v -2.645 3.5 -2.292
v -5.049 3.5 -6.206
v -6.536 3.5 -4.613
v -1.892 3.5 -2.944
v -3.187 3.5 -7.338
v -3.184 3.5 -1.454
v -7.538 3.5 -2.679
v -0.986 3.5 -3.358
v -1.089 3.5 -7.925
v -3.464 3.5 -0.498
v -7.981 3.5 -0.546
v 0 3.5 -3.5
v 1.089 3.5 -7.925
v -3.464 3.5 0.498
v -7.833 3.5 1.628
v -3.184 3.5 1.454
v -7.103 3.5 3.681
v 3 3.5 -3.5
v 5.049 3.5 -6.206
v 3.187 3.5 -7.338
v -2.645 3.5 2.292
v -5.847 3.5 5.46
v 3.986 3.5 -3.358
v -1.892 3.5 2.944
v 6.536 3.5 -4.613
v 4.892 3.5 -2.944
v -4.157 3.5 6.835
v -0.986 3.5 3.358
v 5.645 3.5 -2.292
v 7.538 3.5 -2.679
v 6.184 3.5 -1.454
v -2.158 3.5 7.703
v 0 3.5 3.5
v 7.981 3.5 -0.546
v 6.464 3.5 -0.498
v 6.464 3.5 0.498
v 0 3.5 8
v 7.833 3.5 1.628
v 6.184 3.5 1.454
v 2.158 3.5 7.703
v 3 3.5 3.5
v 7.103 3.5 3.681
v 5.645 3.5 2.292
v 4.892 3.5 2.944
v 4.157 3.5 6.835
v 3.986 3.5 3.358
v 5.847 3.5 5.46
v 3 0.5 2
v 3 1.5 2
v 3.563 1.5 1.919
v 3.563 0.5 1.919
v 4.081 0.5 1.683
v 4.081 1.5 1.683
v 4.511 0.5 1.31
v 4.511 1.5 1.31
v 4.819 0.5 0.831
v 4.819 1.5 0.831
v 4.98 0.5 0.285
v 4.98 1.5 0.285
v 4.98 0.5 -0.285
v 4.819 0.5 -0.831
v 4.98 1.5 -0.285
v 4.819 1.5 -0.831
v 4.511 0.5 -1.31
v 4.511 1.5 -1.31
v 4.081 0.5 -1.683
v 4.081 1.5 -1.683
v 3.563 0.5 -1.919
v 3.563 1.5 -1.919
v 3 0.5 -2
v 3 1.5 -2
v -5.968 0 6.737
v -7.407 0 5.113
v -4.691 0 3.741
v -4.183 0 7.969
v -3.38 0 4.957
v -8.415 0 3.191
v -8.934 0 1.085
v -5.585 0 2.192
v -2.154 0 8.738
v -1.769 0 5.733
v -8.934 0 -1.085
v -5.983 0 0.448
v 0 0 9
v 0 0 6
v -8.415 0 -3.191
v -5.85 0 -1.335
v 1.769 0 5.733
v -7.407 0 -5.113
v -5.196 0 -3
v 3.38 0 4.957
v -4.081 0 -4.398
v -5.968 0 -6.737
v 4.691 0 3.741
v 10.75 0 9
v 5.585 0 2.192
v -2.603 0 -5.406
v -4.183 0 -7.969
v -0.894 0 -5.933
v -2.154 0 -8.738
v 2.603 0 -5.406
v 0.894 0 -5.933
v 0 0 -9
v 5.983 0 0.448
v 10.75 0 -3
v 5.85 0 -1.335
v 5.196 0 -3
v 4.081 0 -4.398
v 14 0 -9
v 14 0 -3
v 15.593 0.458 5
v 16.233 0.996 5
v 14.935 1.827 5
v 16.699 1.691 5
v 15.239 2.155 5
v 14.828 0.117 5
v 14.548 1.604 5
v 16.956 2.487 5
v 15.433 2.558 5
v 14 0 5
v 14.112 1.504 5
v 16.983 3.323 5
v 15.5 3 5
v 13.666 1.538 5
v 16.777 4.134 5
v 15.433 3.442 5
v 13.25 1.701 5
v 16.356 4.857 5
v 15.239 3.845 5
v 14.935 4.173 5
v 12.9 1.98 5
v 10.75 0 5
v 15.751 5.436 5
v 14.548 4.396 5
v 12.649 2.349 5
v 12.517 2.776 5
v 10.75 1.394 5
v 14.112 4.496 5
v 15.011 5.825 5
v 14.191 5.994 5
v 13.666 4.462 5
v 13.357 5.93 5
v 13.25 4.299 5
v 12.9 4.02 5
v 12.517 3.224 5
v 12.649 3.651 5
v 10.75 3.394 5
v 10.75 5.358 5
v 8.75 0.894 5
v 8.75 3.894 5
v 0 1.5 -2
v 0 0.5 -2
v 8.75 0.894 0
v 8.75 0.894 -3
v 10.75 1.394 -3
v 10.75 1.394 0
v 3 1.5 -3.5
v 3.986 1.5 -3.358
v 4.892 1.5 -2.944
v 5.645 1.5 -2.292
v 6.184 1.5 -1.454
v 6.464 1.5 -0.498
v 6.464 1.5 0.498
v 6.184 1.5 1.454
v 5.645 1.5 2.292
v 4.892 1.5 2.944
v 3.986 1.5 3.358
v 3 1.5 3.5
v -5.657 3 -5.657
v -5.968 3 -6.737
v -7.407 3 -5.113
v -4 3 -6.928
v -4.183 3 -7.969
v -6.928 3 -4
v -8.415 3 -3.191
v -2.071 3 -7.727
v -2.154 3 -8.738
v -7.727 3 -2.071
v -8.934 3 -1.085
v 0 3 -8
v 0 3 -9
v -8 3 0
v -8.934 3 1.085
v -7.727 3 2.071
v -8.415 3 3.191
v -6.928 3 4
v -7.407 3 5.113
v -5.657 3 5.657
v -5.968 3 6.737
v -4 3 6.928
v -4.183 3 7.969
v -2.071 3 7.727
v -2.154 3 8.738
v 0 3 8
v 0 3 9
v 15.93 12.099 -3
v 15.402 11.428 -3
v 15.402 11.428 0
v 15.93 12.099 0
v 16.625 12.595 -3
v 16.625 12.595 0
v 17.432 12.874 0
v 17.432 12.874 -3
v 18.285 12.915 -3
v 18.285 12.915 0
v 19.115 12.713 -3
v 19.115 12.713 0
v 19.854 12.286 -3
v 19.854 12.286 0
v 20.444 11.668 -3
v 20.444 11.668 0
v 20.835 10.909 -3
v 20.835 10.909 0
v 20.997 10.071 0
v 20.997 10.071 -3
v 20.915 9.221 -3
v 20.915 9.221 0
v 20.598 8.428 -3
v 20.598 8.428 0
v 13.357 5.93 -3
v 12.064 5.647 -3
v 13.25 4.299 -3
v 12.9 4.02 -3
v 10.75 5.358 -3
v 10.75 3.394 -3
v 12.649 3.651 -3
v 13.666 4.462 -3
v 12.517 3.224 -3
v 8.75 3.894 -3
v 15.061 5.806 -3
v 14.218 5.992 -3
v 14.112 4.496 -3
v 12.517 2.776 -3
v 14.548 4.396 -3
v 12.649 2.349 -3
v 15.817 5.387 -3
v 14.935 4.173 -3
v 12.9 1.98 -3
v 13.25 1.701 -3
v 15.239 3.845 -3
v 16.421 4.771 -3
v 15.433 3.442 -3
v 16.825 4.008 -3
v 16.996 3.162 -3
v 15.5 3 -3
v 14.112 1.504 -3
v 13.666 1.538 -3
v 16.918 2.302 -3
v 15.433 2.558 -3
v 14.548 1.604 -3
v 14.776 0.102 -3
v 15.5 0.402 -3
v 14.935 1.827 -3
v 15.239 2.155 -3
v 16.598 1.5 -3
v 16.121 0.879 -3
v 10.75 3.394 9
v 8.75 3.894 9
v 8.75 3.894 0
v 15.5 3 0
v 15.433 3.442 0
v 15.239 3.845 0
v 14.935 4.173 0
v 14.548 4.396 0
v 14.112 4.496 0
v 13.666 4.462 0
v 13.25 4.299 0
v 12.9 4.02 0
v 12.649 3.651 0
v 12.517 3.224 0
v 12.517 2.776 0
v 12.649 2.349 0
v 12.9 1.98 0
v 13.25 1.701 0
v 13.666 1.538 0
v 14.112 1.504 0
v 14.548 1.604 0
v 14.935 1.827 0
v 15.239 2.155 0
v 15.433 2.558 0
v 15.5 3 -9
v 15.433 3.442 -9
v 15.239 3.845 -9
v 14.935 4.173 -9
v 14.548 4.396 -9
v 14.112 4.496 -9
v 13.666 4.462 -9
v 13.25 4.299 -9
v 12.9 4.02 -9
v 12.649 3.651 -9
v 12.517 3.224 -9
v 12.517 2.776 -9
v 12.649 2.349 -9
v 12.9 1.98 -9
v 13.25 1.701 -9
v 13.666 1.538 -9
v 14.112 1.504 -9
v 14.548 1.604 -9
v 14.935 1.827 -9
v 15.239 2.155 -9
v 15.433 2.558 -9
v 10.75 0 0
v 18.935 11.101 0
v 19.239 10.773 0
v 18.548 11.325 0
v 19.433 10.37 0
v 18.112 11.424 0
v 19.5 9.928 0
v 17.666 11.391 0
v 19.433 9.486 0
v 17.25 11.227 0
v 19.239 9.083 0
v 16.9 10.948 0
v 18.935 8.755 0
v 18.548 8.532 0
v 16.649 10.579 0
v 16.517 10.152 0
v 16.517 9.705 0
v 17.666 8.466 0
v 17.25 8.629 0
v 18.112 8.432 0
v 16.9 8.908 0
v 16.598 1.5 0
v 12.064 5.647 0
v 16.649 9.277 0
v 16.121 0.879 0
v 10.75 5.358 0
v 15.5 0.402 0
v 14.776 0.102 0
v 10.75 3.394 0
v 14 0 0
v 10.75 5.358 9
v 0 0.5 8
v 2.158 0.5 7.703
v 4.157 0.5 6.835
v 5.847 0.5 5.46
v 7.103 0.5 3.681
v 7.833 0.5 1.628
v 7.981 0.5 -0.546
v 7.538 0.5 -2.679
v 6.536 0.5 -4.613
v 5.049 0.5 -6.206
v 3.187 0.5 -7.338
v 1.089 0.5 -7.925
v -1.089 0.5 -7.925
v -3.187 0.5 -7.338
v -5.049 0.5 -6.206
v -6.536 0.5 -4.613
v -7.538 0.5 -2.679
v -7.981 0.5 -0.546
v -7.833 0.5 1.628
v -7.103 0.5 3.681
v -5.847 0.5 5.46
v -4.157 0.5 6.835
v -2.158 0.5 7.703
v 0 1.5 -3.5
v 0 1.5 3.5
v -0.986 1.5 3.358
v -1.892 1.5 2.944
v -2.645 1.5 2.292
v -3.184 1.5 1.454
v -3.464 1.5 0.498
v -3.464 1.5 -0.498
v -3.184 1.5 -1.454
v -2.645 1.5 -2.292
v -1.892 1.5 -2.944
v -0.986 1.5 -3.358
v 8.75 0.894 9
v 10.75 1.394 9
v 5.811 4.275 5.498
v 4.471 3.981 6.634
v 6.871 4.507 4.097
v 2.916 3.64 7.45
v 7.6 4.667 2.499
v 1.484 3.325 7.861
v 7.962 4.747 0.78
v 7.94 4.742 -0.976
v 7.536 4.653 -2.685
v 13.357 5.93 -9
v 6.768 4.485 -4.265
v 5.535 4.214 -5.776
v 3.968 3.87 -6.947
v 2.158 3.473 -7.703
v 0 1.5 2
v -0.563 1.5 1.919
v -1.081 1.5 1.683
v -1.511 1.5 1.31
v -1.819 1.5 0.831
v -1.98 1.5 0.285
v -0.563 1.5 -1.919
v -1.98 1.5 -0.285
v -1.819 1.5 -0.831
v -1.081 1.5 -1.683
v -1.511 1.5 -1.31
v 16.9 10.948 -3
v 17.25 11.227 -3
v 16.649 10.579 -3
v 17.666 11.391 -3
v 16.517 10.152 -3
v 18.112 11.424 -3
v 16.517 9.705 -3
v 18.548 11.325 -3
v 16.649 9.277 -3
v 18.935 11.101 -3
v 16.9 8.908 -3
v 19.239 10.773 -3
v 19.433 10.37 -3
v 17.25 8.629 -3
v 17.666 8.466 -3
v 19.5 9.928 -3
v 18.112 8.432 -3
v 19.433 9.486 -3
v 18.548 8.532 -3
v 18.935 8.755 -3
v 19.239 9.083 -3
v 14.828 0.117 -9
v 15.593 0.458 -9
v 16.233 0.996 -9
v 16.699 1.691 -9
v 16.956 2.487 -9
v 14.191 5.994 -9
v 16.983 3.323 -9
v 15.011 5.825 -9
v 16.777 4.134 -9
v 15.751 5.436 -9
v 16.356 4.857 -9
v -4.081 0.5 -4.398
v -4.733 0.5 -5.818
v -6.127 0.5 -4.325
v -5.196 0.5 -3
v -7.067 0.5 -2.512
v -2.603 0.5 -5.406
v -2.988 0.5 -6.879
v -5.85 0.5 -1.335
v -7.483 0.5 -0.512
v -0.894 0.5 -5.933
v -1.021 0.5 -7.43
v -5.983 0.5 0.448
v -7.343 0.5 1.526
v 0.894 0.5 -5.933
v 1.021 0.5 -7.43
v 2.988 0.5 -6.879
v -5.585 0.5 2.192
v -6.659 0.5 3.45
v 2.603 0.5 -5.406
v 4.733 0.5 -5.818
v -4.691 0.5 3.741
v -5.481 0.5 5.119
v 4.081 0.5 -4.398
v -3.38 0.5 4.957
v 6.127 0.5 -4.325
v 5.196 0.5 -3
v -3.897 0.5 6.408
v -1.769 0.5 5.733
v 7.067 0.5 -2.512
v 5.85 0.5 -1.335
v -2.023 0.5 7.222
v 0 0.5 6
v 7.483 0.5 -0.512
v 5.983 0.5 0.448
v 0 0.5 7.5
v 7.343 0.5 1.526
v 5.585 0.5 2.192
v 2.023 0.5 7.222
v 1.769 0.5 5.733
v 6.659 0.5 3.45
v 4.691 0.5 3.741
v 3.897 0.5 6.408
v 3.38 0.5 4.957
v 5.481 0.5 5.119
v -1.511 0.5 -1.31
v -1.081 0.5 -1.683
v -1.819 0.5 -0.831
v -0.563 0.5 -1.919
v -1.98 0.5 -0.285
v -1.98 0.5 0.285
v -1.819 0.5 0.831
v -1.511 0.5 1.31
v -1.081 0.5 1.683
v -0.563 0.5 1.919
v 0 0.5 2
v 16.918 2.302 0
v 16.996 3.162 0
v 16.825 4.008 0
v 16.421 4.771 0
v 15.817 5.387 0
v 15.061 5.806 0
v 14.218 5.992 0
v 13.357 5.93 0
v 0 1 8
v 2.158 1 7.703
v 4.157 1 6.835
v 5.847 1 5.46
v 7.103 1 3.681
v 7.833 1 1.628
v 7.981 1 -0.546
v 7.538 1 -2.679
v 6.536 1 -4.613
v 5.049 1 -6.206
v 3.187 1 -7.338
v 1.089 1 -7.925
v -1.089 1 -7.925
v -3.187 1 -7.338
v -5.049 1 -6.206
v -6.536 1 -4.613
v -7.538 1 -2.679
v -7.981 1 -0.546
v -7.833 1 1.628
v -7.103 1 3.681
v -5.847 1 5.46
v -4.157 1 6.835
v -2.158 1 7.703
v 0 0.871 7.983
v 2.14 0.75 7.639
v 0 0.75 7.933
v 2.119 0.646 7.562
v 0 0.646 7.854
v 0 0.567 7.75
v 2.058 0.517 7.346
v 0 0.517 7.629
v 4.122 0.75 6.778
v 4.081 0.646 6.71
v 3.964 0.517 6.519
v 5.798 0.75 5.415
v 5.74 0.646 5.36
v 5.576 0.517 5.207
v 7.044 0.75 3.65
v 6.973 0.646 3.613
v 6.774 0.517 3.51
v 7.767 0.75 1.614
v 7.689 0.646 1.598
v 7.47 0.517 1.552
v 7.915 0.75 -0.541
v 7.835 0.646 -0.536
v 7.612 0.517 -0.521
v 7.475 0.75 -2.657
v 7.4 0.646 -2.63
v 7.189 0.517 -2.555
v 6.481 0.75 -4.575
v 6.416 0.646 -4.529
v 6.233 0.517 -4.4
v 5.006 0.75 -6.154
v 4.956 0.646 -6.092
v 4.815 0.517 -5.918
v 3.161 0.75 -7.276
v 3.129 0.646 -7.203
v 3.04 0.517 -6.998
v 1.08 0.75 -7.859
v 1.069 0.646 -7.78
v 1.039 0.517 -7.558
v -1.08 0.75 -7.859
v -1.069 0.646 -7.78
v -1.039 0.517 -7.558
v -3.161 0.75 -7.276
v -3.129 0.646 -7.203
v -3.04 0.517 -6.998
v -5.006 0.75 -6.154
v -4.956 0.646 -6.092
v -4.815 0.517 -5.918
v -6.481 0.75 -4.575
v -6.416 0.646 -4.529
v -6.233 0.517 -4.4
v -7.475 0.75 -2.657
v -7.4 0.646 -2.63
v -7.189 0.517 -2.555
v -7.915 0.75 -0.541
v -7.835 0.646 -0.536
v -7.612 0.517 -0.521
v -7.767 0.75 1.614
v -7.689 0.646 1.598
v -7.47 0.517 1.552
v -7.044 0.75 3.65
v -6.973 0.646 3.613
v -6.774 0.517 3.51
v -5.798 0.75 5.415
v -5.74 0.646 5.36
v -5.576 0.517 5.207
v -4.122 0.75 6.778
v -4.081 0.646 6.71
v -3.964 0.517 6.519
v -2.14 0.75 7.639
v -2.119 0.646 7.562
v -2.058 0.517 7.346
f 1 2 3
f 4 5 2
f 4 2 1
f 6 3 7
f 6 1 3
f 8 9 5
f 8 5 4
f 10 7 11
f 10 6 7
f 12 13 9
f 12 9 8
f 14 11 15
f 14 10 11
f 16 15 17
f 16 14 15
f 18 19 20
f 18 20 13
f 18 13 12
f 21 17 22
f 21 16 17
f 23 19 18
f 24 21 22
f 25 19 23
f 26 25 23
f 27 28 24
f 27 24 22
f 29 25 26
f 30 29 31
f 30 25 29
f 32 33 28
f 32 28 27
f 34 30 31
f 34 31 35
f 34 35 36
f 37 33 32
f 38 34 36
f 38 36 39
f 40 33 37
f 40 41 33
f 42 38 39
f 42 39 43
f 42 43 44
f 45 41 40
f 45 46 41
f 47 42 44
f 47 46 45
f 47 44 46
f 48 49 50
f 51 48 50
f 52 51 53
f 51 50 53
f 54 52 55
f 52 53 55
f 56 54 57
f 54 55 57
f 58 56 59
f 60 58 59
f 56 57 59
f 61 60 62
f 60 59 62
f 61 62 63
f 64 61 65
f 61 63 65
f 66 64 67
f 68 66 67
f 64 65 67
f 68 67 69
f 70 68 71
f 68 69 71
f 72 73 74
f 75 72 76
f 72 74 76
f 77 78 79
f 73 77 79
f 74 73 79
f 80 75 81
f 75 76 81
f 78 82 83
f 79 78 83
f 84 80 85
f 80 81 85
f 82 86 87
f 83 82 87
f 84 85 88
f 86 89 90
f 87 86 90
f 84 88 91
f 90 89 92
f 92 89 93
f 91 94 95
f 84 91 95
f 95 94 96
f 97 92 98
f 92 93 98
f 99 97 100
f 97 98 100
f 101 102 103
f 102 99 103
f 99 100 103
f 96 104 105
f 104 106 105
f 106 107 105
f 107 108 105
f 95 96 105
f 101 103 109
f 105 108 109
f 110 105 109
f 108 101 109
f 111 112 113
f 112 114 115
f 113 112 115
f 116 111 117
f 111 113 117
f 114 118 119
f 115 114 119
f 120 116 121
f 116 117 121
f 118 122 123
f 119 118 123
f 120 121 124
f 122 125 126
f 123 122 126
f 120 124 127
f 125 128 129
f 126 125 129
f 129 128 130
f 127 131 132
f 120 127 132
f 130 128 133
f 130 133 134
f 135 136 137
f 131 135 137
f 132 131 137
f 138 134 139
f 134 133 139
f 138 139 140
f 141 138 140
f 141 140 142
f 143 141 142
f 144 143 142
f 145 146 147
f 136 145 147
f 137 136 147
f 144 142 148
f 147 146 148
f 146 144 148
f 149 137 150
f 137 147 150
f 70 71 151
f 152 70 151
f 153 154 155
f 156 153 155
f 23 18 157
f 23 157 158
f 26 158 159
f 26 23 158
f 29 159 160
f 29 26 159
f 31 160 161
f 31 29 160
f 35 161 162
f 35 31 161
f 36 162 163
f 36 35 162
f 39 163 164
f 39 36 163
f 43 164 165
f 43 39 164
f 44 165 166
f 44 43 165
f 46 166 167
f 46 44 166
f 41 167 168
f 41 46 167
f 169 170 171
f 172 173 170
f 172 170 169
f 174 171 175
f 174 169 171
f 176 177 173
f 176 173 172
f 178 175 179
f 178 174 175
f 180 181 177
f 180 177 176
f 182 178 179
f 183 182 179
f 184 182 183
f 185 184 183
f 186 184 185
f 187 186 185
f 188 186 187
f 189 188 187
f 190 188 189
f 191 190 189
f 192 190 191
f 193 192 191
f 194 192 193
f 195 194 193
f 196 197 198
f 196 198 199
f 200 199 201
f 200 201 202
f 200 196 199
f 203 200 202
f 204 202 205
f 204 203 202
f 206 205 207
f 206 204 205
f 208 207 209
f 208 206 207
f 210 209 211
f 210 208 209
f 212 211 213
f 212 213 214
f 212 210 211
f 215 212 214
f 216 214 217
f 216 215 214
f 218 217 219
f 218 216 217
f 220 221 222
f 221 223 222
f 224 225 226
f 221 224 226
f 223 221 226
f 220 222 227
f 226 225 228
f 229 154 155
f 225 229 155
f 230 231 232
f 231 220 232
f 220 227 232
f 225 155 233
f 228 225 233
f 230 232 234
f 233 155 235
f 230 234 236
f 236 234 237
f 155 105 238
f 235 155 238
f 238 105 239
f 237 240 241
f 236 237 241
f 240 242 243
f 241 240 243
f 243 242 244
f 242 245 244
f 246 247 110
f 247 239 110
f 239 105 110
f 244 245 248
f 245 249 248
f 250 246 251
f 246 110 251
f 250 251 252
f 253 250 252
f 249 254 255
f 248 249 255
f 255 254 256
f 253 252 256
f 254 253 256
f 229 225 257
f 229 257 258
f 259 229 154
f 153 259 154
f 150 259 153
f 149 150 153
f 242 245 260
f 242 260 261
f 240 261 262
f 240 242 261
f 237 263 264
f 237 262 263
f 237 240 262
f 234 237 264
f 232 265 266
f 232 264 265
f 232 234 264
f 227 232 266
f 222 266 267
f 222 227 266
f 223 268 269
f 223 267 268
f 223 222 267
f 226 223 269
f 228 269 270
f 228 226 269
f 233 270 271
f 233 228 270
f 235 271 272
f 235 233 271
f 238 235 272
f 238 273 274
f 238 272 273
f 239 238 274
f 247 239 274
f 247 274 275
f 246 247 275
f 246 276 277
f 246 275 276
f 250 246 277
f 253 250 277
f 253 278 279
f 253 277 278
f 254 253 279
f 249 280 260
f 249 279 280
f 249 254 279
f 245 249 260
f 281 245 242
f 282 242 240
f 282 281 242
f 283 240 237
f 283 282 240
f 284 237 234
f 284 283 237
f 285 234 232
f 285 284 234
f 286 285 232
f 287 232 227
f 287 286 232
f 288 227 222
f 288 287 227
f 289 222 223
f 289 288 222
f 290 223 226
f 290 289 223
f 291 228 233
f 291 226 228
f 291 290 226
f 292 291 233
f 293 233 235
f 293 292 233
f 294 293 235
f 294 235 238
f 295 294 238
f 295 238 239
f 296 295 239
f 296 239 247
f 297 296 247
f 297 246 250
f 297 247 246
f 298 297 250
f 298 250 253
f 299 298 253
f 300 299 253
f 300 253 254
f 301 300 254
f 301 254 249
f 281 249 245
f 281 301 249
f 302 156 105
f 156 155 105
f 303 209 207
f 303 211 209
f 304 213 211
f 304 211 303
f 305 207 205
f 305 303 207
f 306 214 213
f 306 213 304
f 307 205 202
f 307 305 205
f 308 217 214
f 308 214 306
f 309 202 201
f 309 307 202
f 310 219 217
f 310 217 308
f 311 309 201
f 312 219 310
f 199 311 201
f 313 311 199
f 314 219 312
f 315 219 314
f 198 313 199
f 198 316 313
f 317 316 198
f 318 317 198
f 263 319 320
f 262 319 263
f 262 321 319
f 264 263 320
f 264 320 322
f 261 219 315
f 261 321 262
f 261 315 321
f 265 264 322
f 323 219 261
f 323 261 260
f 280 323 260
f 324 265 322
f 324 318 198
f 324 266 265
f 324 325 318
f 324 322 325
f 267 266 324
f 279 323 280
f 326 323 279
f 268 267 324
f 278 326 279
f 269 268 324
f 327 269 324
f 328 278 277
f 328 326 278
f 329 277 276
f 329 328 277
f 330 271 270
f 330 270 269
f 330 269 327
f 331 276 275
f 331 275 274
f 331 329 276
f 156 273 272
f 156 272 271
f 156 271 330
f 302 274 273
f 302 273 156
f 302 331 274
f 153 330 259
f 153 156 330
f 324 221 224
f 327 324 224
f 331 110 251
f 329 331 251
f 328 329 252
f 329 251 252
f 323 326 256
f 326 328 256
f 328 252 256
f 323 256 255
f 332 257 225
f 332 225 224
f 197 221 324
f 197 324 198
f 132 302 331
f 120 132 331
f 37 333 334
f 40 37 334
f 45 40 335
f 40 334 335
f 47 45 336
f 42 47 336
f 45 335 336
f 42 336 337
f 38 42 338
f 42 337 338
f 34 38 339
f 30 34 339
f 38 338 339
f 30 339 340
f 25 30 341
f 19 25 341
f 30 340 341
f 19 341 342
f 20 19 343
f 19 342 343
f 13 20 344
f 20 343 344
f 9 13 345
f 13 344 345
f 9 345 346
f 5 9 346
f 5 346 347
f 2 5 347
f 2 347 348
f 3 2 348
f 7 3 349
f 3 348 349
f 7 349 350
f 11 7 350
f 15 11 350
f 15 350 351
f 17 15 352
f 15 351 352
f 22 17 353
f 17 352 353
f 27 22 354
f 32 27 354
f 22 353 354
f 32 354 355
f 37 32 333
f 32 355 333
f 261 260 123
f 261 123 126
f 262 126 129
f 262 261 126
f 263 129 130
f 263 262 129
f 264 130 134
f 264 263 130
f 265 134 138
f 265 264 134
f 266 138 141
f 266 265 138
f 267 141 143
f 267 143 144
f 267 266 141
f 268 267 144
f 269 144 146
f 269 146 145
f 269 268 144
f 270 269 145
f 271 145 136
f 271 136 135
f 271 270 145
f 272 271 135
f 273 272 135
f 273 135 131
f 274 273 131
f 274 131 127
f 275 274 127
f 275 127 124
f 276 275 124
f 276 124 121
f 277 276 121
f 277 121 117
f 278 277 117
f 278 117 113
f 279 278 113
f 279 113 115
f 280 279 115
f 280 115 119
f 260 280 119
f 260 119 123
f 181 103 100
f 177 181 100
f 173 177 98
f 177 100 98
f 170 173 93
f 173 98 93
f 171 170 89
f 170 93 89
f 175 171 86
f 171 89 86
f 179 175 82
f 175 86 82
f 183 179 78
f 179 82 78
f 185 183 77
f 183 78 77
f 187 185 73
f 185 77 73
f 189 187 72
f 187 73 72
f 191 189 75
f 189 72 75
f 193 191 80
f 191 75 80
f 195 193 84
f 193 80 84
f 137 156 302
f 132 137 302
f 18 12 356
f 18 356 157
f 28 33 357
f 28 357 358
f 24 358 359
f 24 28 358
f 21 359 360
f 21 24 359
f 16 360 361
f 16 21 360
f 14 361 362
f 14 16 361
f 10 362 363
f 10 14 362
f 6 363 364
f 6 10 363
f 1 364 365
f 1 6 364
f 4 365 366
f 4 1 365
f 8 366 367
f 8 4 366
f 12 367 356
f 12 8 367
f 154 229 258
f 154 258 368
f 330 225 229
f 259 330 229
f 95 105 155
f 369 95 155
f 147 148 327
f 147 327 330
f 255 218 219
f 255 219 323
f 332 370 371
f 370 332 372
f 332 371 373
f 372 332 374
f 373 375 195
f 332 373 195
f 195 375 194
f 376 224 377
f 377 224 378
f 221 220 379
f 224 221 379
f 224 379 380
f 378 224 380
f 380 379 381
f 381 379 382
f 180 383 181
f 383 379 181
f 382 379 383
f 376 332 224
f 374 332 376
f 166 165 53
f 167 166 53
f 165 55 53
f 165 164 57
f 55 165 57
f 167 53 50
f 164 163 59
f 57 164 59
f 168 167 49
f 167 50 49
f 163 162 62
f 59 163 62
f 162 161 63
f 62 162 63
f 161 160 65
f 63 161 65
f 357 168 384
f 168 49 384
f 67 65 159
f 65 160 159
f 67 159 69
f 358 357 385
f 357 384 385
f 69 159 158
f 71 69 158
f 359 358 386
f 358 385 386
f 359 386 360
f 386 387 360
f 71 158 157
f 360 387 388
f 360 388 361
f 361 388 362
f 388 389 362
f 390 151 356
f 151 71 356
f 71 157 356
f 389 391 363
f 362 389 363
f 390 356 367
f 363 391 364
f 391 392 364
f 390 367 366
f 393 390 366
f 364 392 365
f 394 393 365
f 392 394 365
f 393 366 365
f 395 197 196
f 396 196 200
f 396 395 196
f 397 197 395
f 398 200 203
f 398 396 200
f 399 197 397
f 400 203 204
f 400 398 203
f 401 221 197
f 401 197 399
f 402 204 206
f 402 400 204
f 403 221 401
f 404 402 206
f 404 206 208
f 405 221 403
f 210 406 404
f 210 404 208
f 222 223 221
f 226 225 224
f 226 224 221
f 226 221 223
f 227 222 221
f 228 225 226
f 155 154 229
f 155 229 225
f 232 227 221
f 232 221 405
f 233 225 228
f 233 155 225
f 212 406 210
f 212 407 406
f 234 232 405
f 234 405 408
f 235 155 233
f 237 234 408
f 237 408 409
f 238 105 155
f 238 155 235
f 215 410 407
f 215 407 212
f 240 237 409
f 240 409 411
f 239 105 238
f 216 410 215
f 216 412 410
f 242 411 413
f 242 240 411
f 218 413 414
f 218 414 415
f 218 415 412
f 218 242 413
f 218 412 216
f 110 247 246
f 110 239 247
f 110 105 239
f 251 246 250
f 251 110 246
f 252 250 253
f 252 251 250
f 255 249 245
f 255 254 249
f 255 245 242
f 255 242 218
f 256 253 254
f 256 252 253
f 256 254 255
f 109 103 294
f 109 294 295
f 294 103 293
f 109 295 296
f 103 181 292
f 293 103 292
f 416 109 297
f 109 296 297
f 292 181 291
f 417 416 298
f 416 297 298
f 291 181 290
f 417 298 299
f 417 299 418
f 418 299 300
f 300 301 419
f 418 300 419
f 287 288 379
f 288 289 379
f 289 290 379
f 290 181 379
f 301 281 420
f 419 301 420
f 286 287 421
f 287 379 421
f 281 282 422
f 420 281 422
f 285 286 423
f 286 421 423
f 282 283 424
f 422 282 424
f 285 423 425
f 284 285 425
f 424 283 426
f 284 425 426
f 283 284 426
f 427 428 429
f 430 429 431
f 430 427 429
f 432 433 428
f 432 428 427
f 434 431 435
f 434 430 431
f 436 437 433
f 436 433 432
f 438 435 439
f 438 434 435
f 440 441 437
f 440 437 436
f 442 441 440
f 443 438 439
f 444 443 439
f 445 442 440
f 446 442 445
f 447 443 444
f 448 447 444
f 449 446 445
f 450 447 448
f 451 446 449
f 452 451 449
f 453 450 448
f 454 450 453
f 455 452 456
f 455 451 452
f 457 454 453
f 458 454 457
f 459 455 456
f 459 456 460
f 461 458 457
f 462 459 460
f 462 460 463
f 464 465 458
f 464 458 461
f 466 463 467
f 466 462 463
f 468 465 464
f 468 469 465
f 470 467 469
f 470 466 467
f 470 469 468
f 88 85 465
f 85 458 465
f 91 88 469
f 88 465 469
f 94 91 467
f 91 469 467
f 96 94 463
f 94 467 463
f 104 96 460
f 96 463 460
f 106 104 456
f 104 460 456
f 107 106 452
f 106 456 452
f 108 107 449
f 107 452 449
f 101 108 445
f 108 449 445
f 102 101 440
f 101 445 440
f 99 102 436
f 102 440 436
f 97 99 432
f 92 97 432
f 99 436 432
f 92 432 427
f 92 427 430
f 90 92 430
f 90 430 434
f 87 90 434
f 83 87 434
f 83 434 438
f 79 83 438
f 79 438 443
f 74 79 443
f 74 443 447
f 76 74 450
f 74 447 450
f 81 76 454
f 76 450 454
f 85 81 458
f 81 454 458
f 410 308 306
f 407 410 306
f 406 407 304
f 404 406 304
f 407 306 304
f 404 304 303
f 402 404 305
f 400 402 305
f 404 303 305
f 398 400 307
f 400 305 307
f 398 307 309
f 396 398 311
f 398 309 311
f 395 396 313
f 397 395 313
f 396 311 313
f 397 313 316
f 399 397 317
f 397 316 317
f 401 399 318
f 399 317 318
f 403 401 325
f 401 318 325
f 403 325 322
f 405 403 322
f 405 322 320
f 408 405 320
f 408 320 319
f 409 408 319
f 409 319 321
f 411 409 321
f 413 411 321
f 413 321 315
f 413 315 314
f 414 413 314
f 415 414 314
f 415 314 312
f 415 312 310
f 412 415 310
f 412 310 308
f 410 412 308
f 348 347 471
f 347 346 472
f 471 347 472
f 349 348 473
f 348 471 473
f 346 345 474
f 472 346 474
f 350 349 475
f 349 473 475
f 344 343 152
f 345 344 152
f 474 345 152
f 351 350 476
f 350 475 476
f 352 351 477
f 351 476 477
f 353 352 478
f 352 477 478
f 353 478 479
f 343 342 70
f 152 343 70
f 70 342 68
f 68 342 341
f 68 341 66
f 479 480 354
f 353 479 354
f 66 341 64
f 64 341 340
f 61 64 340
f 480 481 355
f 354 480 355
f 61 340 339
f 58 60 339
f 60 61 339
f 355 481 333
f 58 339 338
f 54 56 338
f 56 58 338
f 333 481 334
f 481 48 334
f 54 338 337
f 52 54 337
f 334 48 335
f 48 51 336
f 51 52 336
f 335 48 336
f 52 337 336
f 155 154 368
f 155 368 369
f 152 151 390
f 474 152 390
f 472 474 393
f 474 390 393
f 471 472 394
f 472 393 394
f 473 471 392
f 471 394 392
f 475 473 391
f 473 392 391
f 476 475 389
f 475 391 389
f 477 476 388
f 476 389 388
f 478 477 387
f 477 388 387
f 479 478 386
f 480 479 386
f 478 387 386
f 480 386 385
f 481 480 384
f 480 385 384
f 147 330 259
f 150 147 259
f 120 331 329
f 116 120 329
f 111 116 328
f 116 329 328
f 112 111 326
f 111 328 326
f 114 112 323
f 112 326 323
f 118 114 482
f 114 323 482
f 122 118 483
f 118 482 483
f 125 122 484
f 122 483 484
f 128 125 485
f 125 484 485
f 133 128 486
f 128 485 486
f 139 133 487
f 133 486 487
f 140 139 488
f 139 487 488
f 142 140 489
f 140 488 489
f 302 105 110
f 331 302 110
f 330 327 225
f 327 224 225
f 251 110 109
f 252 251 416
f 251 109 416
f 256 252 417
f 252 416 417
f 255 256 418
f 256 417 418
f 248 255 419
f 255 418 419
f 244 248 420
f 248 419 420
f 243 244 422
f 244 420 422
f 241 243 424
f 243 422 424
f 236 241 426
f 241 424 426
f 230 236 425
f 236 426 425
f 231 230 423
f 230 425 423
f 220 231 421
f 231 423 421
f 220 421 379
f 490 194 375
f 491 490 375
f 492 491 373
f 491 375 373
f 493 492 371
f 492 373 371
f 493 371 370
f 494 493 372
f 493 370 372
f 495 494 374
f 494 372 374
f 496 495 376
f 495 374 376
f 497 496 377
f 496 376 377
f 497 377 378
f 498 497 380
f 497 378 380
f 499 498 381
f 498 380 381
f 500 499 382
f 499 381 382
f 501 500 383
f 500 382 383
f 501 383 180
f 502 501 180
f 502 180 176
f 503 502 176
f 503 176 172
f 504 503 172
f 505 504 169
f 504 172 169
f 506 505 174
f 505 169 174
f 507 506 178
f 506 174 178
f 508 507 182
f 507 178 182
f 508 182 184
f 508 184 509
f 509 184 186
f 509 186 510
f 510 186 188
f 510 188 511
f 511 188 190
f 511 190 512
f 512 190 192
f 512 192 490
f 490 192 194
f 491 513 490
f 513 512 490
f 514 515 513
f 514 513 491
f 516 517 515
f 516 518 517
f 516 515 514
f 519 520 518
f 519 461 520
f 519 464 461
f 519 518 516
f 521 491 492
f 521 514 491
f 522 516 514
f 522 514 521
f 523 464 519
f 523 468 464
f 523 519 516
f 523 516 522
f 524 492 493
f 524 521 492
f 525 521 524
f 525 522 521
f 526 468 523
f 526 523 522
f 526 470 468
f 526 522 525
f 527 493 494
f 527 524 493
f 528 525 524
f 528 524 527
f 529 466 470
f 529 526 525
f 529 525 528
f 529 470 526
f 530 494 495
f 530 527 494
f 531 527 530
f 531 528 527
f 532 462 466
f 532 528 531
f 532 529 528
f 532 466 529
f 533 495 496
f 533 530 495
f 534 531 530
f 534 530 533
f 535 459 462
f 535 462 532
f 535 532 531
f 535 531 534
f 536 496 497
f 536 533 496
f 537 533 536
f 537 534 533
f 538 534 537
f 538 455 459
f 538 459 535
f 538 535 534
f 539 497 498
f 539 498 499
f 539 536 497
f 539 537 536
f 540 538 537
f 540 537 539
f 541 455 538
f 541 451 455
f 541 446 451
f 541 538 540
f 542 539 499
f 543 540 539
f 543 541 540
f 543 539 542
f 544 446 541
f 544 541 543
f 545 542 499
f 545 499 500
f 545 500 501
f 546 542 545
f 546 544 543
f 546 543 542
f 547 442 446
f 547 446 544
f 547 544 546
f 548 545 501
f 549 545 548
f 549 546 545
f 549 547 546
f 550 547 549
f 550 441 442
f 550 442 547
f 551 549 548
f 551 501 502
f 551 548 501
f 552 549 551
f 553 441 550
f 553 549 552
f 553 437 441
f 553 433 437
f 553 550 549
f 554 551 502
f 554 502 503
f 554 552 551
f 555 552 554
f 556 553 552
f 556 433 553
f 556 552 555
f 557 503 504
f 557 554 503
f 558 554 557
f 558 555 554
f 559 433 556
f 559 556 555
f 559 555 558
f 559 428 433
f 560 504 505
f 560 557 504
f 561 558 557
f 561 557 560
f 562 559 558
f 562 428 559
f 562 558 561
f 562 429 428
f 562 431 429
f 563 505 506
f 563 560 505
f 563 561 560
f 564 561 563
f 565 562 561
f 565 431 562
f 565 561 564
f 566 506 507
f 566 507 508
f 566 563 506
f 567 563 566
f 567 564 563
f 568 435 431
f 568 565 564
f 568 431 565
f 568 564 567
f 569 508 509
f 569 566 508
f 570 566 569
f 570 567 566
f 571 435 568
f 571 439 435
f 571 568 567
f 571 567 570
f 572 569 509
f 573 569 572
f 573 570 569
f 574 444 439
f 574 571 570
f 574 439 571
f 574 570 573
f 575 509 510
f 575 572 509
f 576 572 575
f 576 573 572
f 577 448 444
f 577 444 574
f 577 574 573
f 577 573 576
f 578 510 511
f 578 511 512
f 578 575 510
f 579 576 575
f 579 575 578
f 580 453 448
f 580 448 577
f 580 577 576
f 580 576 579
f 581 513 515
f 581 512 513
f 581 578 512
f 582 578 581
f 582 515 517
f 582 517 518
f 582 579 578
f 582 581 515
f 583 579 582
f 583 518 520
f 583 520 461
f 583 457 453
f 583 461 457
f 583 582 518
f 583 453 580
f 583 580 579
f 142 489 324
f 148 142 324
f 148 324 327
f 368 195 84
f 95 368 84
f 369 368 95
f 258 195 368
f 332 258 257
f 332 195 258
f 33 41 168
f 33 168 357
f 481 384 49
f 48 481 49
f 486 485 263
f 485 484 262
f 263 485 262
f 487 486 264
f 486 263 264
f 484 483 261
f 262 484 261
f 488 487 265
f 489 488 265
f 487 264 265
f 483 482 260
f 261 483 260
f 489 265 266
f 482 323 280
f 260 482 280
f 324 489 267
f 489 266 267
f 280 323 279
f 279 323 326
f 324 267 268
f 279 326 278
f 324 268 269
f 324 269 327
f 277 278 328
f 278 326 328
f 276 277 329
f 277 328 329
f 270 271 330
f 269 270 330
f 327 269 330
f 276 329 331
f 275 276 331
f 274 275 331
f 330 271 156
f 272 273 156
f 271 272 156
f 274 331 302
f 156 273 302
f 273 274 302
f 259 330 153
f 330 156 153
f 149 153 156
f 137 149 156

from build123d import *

# Parameters (mm, degrees)
SKETCH1_R               = 9
BOSS_EXTRUDE1_DEPTH     = 3
BOSS_EXTRUDE2_START     = -9
BOSS_EXTRUDE2_DEPTH     = 18
SKETCH5_R               = 8
CUT_EXTRUDE3_DEPTH      = 2.5
SKETCH6_R               = 6
CUT_EXTRUDE4_DEPTH      = 2.5
FILLET3_R               = 0.5
CUT_EXTRUDE5_DEPTH      = 4
HOLE1_START             = -9
HOLE1_OUTLINE_R         = 1.5
HOLE1_DEPTH             = 14
BOSS_EXTRUDE4_DEPTH     = 3
F_3_0_MM_DOWEL_HOLES1_D = 3
SKETCH14_R              = 8
BOSS_EXTRUDE5_DEPTH     = 3
CUT_EXTRUDE6_DEPTH      = 2
CUT_EXTRUDE7_DEPTH      = 2
SPLIT1_SURFACE_1_BACK   = 38.298
SPLIT1_SURFACE_1_DEPTH  = 76.596
SPLIT1_SURFACE_2_BACK   = 38.298
SPLIT1_SURFACE_2_DEPTH  = 76.596
SPLIT2_SURFACE_3_BACK   = 38.298
SPLIT2_SURFACE_3_DEPTH  = 76.596
SPLIT2_SURFACE_4_BACK   = 38.298
SPLIT2_SURFACE_4_DEPTH  = 76.596
SPLIT3_SURFACE_5_BACK   = 38.298
SPLIT3_SURFACE_5_DEPTH  = 76.596
SPLIT3_SURFACE_6_BACK   = 38.298
SPLIT3_SURFACE_6_DEPTH  = 76.596
SPLIT4_SURFACE_7_BACK   = 38.298
SPLIT4_SURFACE_7_DEPTH  = 76.596
SPLIT4_SURFACE_8_BACK   = 38.298
SPLIT4_SURFACE_8_DEPTH  = 76.596
SPLIT5_START            = -3
SPLIT5_DEPTH            = 3
SPLIT5_2_DEPTH          = 12
SPLIT5_3_DEPTH          = 5
SPLIT5_START_2          = 5
SPLIT5_4_DEPTH          = 4


with BuildPart() as part:
    # Sketch1 → Boss-Extrude1 (new body)
    with BuildSketch(Plane(origin=(0, 0, 0), x_dir=(1, 0, 0), z_dir=(0, 1, 0))):
        with Locations(Location((0, 0, 0), (0, 0, 270))):
            Circle(SKETCH1_R)
    extrude(amount=BOSS_EXTRUDE1_DEPTH)

    # Boss-Extrude2: read off the stored shape, not the designer's step
    # Boss-Extrude2 outline → Boss-Extrude2 (add)
    with BuildSketch(Plane.XY.offset(BOSS_EXTRUDE2_START)):
        with BuildLine():
            Line((13.357142857, 5.930313071), (0, 3))
            Line((0, 3), (0, 0))
            Line((0, 0), (14, 0))
            ThreePointArc((14, 0), (16.982527386, 3.323311604), (13.357142857, 5.930313071))
        make_face()
    extrude(amount=BOSS_EXTRUDE2_DEPTH)

    # Sketch5 → Cut-Extrude3 (cut, symmetric)
    with BuildSketch(Plane(origin=(0, 3, 0), x_dir=(1, 0, 0), z_dir=(0, 1, 0))):
        with Locations(Location((0, 0, 0), (0, 0, 270))):
            Circle(SKETCH5_R)
    extrude(amount=CUT_EXTRUDE3_DEPTH, both=True, mode=Mode.SUBTRACT)

    # Sketch6 → Cut-Extrude4 (cut, symmetric)
    with BuildSketch(Plane(origin=(0, 0.5, 0), x_dir=(1, 0, 0), z_dir=(0, 1, 0))):
        with Locations(Location((0, 0, 0), (0, 0, 270))):
            Circle(SKETCH6_R)
    extrude(amount=CUT_EXTRUDE4_DEPTH, both=True, mode=Mode.SUBTRACT)

    # Fillet3
    fillet3_edges = [part.edges().sort_by_distance(p)[0] for p in [
        (0, 0.5, -8),
    ]]
    fillet(fillet3_edges, radius=FILLET3_R)

    # Sketch7 → Cut-Extrude5 (cut)
    with BuildSketch(Plane(origin=(0, 0, 9), x_dir=(-1, 0, 0), z_dir=(0, 0, -1))):
        Polygon((-10.75, -52.569250145), (-10.75, -0.796086747), (-10.75, 6.228178627), (-10.75, 58.001342025), (-114.296326796, 58.001342025), (-114.296326796, -52.569250145), align=None)
    extrude(amount=CUT_EXTRUDE5_DEPTH, mode=Mode.SUBTRACT)

    # Hole1: read off the stored shape, not the designer's step
    # Hole1 outline → Hole1 (cut)
    with BuildSketch(Plane.XY.offset(HOLE1_START)):
        with Locations((14, 3)):
            Circle(HOLE1_OUTLINE_R)
    extrude(amount=HOLE1_DEPTH, mode=Mode.SUBTRACT)

    # Sketch9 → Boss-Extrude4 (add)
    with BuildSketch(Plane(origin=(0, 0, -3), x_dir=(-1, 0, 0), z_dir=(0, 0, -1))):
        with BuildLine():
            Line((-20.598076211, 8.42820323), (-16.598076211, 1.5))
            ThreePointArc((-16.598076211, 1.5), (-16.421288681, 4.771259756), (-13.357142857, 5.930313071))
            Line((-13.357142857, 5.930313071), (-12.063915065, 5.646602524))
            Line((-12.063915065, 5.646602524), (-15.401923789, 11.42820323))
            ThreePointArc((-15.401923789, 11.42820323), (-19.5, 12.526279442), (-20.598076211, 8.42820323))
        make_face()
    extrude(amount=-BOSS_EXTRUDE4_DEPTH)

    # Ø3.0 mm Dowel Holes1 (through all)
    with Locations(Plane(origin=(18, 9.92820323, -3), x_dir=(-1, 0, 0), z_dir=(0, 0, -1))):
        with Locations((0, 0)):
            Hole(F_3_0_MM_DOWEL_HOLES1_D / 2)


with BuildPart() as body_2:
    # Sketch14 → Boss-Extrude5 (new body)
    with BuildSketch(Plane(origin=(0, 0.5, 0), x_dir=(1, 0, 0), z_dir=(0, 1, 0))):
        with Locations(Location((0, 0, 0), (0, 0, 270))):
            Circle(SKETCH14_R)
    extrude(amount=BOSS_EXTRUDE5_DEPTH)

    # Sketch15 → Cut-Extrude6 (cut)
    with BuildSketch(Plane(origin=(0, 3.5, 0), x_dir=(1, 0, 0), z_dir=(0, 1, 0))):
        with BuildLine():
            Line((0, 3.5), (3, 3.5))
            ThreePointArc((3, 3.5), (6.5, 0), (3, -3.5))
            Line((3, -3.5), (0, -3.5))
            ThreePointArc((0, -3.5), (-3.5, 0), (0, 3.5))
        make_face()
    extrude(amount=-CUT_EXTRUDE6_DEPTH, mode=Mode.SUBTRACT)

    # Sketch17 → Cut-Extrude7 (cut)
    with BuildSketch(Plane(origin=(0, 1.5, 0), x_dir=(1, 0, 0), z_dir=(0, 1, 0))):
        with BuildLine():
            Line((0, -2), (3, -2))
            ThreePointArc((3, -2), (5, 0), (3, 2))
            Line((3, 2), (0, 2))
            ThreePointArc((0, 2), (-2, 0), (0, -2))
        make_face()
    extrude(amount=-CUT_EXTRUDE7_DEPTH, mode=Mode.SUBTRACT)


with BuildPart() as body_3:
    # Split1: the piece behind the surface
    add(part.part)
    # Split1 surface: a surface, the sketch's curves swept straight by 76.596 mm
    with BuildLine(Plane.XY.offset(9).offset(-SPLIT1_SURFACE_1_BACK), mode=Mode.PRIVATE) as split1_surface_1_path:
        Line((10.75, 7.850645476), (10.75, 3.394442709))
        Line((10.75, 3.394442709), (8.750335479, 3.894442709))
        Line((8.750335479, 3.894442709), (8.750335479, 0.894442709))
        Line((8.750335479, 0.894442709), (10.75, 1.394442709))
        Line((10.75, 1.394442709), (10.75, -1.763593227))
    split1_surface_1 = Shell.extrude(split1_surface_1_path.wire(), (0 * SPLIT1_SURFACE_1_DEPTH, 0 * SPLIT1_SURFACE_1_DEPTH, 1 * SPLIT1_SURFACE_1_DEPTH))
    split(bisect_by=split1_surface_1, keep=Keep.BOTTOM)


with BuildPart() as part_1:
    add(part.part)

    # Split1: split by a surface, the side it looks to stays
    # Split1 surface: a surface, the sketch's curves swept straight by 76.596 mm
    with BuildLine(Plane.XY.offset(9).offset(-SPLIT1_SURFACE_2_BACK), mode=Mode.PRIVATE) as split1_surface_2_path:
        Line((10.75, 7.850645476), (10.75, 3.394442709))
        Line((10.75, 3.394442709), (8.750335479, 3.894442709))
        Line((8.750335479, 3.894442709), (8.750335479, 0.894442709))
        Line((8.750335479, 0.894442709), (10.75, 1.394442709))
        Line((10.75, 1.394442709), (10.75, -1.763593227))
    split1_surface_2 = Shell.extrude(split1_surface_2_path.wire(), (0 * SPLIT1_SURFACE_2_DEPTH, 0 * SPLIT1_SURFACE_2_DEPTH, 1 * SPLIT1_SURFACE_2_DEPTH))
    split(bisect_by=split1_surface_2, keep=Keep.TOP)


with BuildPart() as body_4:
    # Split2: the piece behind the surface
    add(part_1.part)
    # Split2 surface: a surface, the sketch's curves swept straight by 76.596 mm
    with BuildLine(Plane(origin=(0, 3.5, 0), x_dir=(1, 0, 0), z_dir=(0, 1, 0)).offset(-SPLIT2_SURFACE_3_BACK), mode=Mode.PRIVATE) as split2_surface_3_path:
        Line((27.399686623, 0), (10.75, 0))
        Line((10.75, 0), (10.75, 3))
        Line((10.75, 3), (26.181796161, 3))
    split2_surface_3 = Shell.extrude(split2_surface_3_path.wire(), (0 * SPLIT2_SURFACE_3_DEPTH, 1 * SPLIT2_SURFACE_3_DEPTH, 0 * SPLIT2_SURFACE_3_DEPTH))
    split(bisect_by=split2_surface_3, keep=Keep.BOTTOM)


with BuildPart() as part_2:
    add(part_1.part)

    # Split2: split by a surface, the side it looks to stays
    # Split2 surface: a surface, the sketch's curves swept straight by 76.596 mm
    with BuildLine(Plane(origin=(0, 3.5, 0), x_dir=(1, 0, 0), z_dir=(0, 1, 0)).offset(-SPLIT2_SURFACE_4_BACK), mode=Mode.PRIVATE) as split2_surface_4_path:
        Line((27.399686623, 0), (10.75, 0))
        Line((10.75, 0), (10.75, 3))
        Line((10.75, 3), (26.181796161, 3))
    split2_surface_4 = Shell.extrude(split2_surface_4_path.wire(), (0 * SPLIT2_SURFACE_4_DEPTH, 1 * SPLIT2_SURFACE_4_DEPTH, 0 * SPLIT2_SURFACE_4_DEPTH))
    split(bisect_by=split2_surface_4, keep=Keep.TOP)


with BuildPart() as body_5:
    # Split3: the piece behind the surface
    add(part_2.part)
    # Split3 surface: a surface, the sketch's curves swept straight by 76.596 mm
    with BuildLine(Plane(origin=(0, 3.5, 0), x_dir=(1, 0, 0), z_dir=(0, 1, 0)).offset(-SPLIT3_SURFACE_5_BACK), mode=Mode.PRIVATE) as split3_surface_5_path:
        Line((10.75, 0), (24.171696764, 0))
        Line((24.171696764, 0), (24.171696764, -5))
        Line((24.171696764, -5), (10.75, -5))
        Line((10.75, -5), (10.75, 0))
    split3_surface_5 = Shell.extrude(split3_surface_5_path.wire(), (0 * SPLIT3_SURFACE_5_DEPTH, 1 * SPLIT3_SURFACE_5_DEPTH, 0 * SPLIT3_SURFACE_5_DEPTH))
    split(bisect_by=split3_surface_5, keep=Keep.BOTTOM)


with BuildPart() as part_3:
    add(part_2.part)

    # Split3: split by a surface, the side it looks to stays
    # Split3 surface: a surface, the sketch's curves swept straight by 76.596 mm
    with BuildLine(Plane(origin=(0, 3.5, 0), x_dir=(1, 0, 0), z_dir=(0, 1, 0)).offset(-SPLIT3_SURFACE_6_BACK), mode=Mode.PRIVATE) as split3_surface_6_path:
        Line((10.75, 0), (24.171696764, 0))
        Line((24.171696764, 0), (24.171696764, -5))
        Line((24.171696764, -5), (10.75, -5))
        Line((10.75, -5), (10.75, 0))
    split3_surface_6 = Shell.extrude(split3_surface_6_path.wire(), (0 * SPLIT3_SURFACE_6_DEPTH, 1 * SPLIT3_SURFACE_6_DEPTH, 0 * SPLIT3_SURFACE_6_DEPTH))
    split(bisect_by=split3_surface_6, keep=Keep.TOP)


with BuildPart() as body_6:
    # Split4: the piece behind the surface
    add(part_3.part)
    # Split4 surface: a surface, the sketch's curves swept straight by 76.596 mm
    with BuildLine(Plane.XY.offset(9).offset(-SPLIT4_SURFACE_7_BACK), mode=Mode.PRIVATE) as split4_surface_7_path:
        Line((8.750335479, 0.894442709), (10.75, 1.394442709))
        Line((10.75, 1.394442709), (10.75, 3.394442709))
        Line((10.75, 3.394442709), (8.750335479, 3.894442709))
        Line((8.750335479, 3.894442709), (8.750335479, 0.894442709))
    split4_surface_7 = Shell.extrude(split4_surface_7_path.wire(), (0 * SPLIT4_SURFACE_7_DEPTH, 0 * SPLIT4_SURFACE_7_DEPTH, 1 * SPLIT4_SURFACE_7_DEPTH))
    split(bisect_by=split4_surface_7, keep=Keep.BOTTOM)


with BuildPart() as part_4:
    add(part_3.part)

    # Split4: split by a surface, the side it looks to stays
    # Split4 surface: a surface, the sketch's curves swept straight by 76.596 mm
    with BuildLine(Plane.XY.offset(9).offset(-SPLIT4_SURFACE_8_BACK), mode=Mode.PRIVATE) as split4_surface_8_path:
        Line((8.750335479, 0.894442709), (10.75, 1.394442709))
        Line((10.75, 1.394442709), (10.75, 3.394442709))
        Line((10.75, 3.394442709), (8.750335479, 3.894442709))
        Line((8.750335479, 3.894442709), (8.750335479, 0.894442709))
    split4_surface_8 = Shell.extrude(split4_surface_8_path.wire(), (0 * SPLIT4_SURFACE_8_DEPTH, 0 * SPLIT4_SURFACE_8_DEPTH, 1 * SPLIT4_SURFACE_8_DEPTH))
    split(bisect_by=split4_surface_8, keep=Keep.TOP)

    # Split5 2 outline → Split5 2 (cut)
    with BuildSketch(Plane.XY.offset(SPLIT5_START)):
        Polygon((8.750335479, 0.894442709), (10.75, 1.394442709), (10.75, 3.394442709), (8.750335479, 3.894442709), align=None)
    extrude(amount=SPLIT5_2_DEPTH, mode=Mode.SUBTRACT)


with BuildPart() as body_7:
    # Split5: read off the stored shape, not the designer's step
    # Split5 outline → Split5 (new body)
    with BuildSketch(Plane.XY.offset(SPLIT5_START)):
        Polygon((10.75, 3.394442709), (8.750335479, 3.894442709), (8.750335479, 0.894442709), (10.75, 1.394442709), align=None)
    extrude(amount=SPLIT5_DEPTH)


with BuildPart() as body_8:
    # Split5 3 outline → Split5 3 (new body)
    with BuildSketch(Plane.XY):
        Polygon((10.75, 3.394442709), (8.750335479, 3.894442709), (8.750335479, 0.894442709), (10.75, 1.394442709), align=None)
    extrude(amount=SPLIT5_3_DEPTH)


with BuildPart() as body_9:
    # Split5 4 outline → Split5 4 (new body)
    with BuildSketch(Plane.XY.offset(SPLIT5_START_2)):
        Polygon((10.75, 3.394442709), (8.750335479, 3.894442709), (8.750335479, 0.894442709), (10.75, 1.394442709), align=None)
    extrude(amount=SPLIT5_4_DEPTH)


with BuildPart() as body_5_1:
    add(body_5.part)

    # Combine1: read off the stored shape, not the designer's step
    # Combine1: union body 8
    add(body_8.part)


with BuildPart() as body_3_1:
    add(body_3.part)

    # Combine2: read off the stored shape, not the designer's step
    # Combine2: union part, body 6
    add(part_4.part)
    add(body_6.part)


with BuildPart() as body_4_1:
    add(body_4.part)

    # Combine3: read off the stored shape, not the designer's step
    # Combine3: union body 7
    add(body_7.part)


solid = Compound([body_2.part, body_5_1.part, body_3_1.part, body_4_1.part])
